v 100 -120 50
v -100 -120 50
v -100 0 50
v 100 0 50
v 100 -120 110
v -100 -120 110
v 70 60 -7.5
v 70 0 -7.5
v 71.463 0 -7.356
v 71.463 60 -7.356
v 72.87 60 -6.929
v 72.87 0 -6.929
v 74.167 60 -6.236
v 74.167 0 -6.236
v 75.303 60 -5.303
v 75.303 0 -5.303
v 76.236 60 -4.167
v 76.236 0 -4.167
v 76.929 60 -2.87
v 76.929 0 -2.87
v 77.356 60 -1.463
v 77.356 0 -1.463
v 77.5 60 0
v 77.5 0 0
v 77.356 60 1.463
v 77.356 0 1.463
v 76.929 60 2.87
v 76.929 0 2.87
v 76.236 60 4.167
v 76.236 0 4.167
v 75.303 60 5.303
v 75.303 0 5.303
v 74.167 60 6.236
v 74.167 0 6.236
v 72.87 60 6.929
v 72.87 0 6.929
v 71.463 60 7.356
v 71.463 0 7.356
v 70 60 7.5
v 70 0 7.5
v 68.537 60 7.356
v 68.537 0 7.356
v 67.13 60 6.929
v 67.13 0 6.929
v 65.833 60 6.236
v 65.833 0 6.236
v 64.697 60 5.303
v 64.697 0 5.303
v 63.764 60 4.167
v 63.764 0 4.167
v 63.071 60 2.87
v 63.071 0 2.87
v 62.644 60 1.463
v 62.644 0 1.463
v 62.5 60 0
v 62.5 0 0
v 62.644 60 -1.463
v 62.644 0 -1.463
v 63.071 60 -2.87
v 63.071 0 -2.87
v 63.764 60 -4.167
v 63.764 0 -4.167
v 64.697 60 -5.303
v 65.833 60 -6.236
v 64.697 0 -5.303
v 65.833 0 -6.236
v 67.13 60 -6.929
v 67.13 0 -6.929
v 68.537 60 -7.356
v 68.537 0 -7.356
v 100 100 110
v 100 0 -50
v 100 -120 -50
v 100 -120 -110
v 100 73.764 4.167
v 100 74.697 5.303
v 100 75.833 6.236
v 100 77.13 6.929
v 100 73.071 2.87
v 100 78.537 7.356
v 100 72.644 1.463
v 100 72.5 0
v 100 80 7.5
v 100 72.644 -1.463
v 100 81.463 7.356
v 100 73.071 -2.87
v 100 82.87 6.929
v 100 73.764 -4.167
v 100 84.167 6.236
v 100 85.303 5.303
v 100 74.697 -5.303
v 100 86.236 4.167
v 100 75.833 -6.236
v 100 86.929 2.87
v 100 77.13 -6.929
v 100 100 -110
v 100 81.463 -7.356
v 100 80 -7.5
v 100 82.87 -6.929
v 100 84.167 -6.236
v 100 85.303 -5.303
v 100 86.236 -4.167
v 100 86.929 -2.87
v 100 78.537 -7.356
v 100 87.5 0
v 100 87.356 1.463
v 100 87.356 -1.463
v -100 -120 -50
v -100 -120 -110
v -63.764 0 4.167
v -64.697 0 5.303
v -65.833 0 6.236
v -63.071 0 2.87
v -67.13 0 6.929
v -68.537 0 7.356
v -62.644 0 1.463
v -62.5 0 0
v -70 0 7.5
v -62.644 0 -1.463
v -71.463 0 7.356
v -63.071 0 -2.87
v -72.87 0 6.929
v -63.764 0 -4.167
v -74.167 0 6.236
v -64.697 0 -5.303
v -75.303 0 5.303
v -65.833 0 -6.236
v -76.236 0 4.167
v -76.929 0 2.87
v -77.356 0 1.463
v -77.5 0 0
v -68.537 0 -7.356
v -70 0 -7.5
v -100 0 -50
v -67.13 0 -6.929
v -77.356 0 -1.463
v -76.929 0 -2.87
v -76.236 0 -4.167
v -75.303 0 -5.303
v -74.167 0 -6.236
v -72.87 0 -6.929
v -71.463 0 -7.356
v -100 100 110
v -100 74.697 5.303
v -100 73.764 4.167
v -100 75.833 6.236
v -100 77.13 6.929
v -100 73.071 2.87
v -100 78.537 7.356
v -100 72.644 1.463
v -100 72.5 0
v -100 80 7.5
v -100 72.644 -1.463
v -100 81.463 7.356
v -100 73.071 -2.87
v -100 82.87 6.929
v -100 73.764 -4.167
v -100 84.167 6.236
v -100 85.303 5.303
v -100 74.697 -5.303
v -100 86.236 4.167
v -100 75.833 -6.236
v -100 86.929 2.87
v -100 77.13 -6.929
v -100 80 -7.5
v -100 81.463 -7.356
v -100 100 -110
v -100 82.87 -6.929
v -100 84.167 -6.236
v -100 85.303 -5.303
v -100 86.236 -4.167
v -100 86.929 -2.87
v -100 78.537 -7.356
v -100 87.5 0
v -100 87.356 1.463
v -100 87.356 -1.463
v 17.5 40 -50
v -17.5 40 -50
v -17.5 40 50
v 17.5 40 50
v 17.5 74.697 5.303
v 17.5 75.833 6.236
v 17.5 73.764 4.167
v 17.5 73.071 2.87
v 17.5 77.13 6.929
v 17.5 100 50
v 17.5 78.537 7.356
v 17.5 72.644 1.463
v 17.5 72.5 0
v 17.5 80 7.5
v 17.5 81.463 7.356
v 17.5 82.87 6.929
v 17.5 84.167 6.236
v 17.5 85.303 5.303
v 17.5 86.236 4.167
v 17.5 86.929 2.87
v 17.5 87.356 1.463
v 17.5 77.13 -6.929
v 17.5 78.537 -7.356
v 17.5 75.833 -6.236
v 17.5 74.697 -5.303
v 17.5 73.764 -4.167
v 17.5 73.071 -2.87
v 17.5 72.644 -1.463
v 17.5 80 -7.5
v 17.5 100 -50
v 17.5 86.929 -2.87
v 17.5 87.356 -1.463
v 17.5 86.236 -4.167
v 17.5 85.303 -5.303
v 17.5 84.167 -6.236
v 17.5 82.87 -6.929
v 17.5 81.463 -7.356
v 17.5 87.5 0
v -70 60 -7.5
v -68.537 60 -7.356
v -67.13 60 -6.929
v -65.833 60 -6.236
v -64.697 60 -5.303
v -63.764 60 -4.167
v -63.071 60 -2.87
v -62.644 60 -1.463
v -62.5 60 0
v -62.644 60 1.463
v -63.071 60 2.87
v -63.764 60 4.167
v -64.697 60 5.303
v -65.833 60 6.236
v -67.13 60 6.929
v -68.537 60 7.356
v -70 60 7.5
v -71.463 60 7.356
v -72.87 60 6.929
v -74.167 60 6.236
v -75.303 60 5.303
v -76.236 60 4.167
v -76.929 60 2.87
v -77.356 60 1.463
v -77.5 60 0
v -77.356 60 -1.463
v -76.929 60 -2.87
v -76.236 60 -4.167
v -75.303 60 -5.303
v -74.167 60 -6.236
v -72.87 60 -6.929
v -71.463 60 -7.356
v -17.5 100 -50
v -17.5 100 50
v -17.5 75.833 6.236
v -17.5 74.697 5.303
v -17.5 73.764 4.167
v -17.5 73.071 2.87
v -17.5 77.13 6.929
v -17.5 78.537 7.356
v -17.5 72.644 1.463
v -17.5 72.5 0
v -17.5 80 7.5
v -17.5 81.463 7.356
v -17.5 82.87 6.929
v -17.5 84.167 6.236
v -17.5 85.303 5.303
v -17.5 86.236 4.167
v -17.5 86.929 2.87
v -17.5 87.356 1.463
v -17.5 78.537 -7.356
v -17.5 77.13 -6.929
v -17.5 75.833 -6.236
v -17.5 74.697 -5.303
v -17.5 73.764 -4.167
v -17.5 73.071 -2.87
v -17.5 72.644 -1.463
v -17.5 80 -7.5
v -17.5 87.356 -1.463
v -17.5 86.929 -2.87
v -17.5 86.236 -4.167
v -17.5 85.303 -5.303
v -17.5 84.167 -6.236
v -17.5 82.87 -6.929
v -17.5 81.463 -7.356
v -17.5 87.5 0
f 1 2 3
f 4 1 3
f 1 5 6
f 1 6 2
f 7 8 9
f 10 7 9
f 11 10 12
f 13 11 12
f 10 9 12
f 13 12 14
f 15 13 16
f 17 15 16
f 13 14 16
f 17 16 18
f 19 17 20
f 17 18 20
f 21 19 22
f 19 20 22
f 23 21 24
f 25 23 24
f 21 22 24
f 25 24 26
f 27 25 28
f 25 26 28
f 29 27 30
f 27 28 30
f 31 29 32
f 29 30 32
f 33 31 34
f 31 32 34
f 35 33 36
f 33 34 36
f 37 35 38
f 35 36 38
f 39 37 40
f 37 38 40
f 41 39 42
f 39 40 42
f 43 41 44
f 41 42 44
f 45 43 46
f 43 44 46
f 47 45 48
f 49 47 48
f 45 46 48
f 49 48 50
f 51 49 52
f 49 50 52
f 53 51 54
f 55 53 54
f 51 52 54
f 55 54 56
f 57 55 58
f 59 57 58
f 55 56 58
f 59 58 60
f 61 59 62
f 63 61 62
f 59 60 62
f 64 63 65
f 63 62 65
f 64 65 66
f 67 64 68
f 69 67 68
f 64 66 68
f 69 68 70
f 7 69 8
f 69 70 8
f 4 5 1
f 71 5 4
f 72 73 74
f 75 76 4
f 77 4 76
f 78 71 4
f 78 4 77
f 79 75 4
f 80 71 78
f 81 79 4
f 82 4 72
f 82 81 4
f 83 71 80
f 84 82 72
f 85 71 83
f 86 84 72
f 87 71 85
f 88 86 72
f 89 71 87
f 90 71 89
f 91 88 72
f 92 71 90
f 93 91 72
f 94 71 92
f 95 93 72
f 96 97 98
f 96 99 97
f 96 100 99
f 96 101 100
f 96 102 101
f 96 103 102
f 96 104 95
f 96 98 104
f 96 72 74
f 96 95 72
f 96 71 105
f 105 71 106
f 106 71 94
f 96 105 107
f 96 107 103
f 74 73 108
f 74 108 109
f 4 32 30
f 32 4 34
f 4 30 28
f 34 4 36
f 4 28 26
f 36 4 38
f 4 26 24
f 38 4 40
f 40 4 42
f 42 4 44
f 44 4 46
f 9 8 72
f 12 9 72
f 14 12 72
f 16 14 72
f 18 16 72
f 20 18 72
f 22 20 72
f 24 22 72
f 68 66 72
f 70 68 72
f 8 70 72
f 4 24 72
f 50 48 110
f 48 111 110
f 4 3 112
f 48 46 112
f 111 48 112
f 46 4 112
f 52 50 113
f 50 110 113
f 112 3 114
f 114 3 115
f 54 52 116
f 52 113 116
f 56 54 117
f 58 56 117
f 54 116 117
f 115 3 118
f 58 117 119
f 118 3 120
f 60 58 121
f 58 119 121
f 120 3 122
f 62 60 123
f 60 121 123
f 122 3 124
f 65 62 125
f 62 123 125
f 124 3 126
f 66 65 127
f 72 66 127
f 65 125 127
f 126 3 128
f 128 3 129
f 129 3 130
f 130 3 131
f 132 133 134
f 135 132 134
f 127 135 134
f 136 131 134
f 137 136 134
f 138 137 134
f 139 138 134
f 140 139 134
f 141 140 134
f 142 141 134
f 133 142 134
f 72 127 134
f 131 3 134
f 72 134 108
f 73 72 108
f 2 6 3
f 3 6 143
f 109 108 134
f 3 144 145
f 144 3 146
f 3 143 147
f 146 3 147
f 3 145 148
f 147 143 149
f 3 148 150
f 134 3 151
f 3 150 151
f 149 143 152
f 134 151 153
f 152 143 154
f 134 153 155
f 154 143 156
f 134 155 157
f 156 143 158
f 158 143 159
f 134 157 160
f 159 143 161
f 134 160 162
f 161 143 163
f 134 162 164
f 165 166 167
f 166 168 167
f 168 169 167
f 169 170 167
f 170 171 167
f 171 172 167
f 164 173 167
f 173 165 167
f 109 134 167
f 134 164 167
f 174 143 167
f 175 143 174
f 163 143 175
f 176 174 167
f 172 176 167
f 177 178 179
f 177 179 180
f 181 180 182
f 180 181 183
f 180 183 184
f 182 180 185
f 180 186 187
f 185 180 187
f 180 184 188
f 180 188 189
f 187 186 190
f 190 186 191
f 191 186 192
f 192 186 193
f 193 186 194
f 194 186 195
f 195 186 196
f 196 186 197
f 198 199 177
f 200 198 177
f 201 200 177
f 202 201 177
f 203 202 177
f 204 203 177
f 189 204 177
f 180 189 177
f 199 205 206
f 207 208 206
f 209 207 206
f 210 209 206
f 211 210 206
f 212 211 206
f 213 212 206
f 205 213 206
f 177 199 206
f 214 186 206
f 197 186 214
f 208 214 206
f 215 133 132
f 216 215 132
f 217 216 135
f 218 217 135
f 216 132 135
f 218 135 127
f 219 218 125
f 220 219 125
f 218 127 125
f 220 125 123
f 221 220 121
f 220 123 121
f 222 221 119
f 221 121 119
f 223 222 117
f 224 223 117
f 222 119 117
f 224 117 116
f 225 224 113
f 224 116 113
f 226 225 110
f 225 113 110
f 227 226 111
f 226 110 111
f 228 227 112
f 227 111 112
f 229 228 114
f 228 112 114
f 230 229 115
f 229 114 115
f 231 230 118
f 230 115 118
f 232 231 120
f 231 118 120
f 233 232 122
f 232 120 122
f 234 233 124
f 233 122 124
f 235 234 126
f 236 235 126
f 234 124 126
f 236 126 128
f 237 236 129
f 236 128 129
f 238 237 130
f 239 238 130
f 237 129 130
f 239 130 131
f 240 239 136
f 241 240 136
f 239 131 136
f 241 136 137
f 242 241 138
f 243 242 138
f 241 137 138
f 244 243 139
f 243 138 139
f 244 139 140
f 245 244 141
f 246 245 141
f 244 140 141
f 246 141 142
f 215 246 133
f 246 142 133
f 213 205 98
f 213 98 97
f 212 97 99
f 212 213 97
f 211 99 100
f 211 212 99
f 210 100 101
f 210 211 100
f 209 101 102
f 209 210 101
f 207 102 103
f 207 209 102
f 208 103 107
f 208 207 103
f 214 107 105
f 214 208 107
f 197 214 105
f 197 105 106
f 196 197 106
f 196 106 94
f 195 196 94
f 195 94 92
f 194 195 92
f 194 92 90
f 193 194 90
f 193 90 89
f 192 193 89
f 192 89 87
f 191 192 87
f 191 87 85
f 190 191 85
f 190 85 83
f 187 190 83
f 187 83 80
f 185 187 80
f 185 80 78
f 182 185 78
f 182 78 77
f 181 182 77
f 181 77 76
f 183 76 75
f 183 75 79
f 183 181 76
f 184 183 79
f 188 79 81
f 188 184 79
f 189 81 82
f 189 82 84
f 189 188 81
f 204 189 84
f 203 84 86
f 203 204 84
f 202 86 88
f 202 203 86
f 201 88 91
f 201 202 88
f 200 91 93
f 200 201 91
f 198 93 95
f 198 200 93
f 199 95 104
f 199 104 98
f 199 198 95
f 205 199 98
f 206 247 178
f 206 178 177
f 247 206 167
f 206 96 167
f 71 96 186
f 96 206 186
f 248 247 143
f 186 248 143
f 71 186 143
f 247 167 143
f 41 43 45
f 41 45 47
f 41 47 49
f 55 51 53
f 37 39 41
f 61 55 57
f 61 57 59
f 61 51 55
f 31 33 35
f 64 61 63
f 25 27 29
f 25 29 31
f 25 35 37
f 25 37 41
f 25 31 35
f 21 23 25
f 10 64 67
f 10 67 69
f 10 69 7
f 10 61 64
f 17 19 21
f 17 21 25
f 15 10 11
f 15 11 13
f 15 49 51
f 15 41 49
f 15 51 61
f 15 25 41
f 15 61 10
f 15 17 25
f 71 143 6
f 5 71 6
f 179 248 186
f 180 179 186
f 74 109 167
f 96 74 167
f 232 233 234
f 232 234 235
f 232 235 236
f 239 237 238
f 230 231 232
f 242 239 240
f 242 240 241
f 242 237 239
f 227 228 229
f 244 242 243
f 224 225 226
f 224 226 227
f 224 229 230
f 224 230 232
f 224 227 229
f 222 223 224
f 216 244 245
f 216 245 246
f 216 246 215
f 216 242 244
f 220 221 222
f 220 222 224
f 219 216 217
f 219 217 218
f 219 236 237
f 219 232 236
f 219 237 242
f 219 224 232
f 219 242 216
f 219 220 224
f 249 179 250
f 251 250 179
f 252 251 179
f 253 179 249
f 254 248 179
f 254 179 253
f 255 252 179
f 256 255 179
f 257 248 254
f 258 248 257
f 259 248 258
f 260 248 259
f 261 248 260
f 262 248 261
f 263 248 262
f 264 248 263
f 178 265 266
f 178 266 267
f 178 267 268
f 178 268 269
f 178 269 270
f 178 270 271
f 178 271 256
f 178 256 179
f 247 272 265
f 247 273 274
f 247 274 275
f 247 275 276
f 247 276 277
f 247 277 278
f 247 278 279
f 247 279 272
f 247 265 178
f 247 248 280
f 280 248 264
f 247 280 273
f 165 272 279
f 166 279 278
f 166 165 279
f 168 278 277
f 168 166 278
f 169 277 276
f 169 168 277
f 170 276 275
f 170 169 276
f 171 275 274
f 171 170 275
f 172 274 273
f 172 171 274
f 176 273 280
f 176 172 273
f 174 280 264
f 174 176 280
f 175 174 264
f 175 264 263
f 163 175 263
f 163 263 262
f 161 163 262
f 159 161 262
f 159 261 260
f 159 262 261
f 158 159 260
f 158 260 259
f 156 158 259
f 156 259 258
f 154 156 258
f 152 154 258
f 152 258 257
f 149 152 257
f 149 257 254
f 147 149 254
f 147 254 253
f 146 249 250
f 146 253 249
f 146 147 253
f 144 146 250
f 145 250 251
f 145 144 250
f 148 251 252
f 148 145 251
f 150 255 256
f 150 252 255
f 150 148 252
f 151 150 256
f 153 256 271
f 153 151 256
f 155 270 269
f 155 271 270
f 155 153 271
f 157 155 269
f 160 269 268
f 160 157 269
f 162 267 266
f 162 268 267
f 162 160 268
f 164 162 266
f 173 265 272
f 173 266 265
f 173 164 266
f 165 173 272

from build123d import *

# Parameters (mm, degrees)
BOSS_EXTRUDE2_DEPTH      = 100
BOSS_EXTRUDE2_DEPTH_BACK = 100
SKETCH3_R                = 7.5
SKETCH4_W                = 35
SKETCH4_H                = 100
CUT_EXTRUDE1_DEPTH       = 60
SKETCH5_R                = 7.5
CUT_EXTRUDE2_DEPTH       = 60


with BuildPart() as part:
    # Sketch3 → Boss-Extrude2 (new, two sides: drawn at the far end of the back side and taken through both)
    with BuildSketch(Plane(origin=(0, 0, 0), x_dir=(0, 0, -1), z_dir=(1, 0, 0)).offset(-BOSS_EXTRUDE2_DEPTH_BACK)):
        Polygon((-110, -120), (-50, -120), (-50, 0), (50, 0), (50, -120), (110, -120), (110, 100), (-110, 100), align=None)
        with Locations((0, 80)):
            Circle(SKETCH3_R, mode=Mode.SUBTRACT)
    extrude(amount=BOSS_EXTRUDE2_DEPTH + BOSS_EXTRUDE2_DEPTH_BACK)

    # Sketch4 → Cut-Extrude1 (cut)
    with BuildSketch(Plane(origin=(0, 100, 0), x_dir=(1, 0, 0), z_dir=(0, 1, 0))):
        Rectangle(SKETCH4_W, SKETCH4_H)
    extrude(amount=-CUT_EXTRUDE1_DEPTH, mode=Mode.SUBTRACT)

    # Sketch5 → Cut-Extrude2 (cut)
    with BuildSketch(Plane.XZ):
        with Locations((-70, 0)):
            Circle(SKETCH5_R)
        with Locations((70, 0)):
            Circle(SKETCH5_R)
    extrude(amount=-CUT_EXTRUDE2_DEPTH, mode=Mode.SUBTRACT)


solid = part.part
